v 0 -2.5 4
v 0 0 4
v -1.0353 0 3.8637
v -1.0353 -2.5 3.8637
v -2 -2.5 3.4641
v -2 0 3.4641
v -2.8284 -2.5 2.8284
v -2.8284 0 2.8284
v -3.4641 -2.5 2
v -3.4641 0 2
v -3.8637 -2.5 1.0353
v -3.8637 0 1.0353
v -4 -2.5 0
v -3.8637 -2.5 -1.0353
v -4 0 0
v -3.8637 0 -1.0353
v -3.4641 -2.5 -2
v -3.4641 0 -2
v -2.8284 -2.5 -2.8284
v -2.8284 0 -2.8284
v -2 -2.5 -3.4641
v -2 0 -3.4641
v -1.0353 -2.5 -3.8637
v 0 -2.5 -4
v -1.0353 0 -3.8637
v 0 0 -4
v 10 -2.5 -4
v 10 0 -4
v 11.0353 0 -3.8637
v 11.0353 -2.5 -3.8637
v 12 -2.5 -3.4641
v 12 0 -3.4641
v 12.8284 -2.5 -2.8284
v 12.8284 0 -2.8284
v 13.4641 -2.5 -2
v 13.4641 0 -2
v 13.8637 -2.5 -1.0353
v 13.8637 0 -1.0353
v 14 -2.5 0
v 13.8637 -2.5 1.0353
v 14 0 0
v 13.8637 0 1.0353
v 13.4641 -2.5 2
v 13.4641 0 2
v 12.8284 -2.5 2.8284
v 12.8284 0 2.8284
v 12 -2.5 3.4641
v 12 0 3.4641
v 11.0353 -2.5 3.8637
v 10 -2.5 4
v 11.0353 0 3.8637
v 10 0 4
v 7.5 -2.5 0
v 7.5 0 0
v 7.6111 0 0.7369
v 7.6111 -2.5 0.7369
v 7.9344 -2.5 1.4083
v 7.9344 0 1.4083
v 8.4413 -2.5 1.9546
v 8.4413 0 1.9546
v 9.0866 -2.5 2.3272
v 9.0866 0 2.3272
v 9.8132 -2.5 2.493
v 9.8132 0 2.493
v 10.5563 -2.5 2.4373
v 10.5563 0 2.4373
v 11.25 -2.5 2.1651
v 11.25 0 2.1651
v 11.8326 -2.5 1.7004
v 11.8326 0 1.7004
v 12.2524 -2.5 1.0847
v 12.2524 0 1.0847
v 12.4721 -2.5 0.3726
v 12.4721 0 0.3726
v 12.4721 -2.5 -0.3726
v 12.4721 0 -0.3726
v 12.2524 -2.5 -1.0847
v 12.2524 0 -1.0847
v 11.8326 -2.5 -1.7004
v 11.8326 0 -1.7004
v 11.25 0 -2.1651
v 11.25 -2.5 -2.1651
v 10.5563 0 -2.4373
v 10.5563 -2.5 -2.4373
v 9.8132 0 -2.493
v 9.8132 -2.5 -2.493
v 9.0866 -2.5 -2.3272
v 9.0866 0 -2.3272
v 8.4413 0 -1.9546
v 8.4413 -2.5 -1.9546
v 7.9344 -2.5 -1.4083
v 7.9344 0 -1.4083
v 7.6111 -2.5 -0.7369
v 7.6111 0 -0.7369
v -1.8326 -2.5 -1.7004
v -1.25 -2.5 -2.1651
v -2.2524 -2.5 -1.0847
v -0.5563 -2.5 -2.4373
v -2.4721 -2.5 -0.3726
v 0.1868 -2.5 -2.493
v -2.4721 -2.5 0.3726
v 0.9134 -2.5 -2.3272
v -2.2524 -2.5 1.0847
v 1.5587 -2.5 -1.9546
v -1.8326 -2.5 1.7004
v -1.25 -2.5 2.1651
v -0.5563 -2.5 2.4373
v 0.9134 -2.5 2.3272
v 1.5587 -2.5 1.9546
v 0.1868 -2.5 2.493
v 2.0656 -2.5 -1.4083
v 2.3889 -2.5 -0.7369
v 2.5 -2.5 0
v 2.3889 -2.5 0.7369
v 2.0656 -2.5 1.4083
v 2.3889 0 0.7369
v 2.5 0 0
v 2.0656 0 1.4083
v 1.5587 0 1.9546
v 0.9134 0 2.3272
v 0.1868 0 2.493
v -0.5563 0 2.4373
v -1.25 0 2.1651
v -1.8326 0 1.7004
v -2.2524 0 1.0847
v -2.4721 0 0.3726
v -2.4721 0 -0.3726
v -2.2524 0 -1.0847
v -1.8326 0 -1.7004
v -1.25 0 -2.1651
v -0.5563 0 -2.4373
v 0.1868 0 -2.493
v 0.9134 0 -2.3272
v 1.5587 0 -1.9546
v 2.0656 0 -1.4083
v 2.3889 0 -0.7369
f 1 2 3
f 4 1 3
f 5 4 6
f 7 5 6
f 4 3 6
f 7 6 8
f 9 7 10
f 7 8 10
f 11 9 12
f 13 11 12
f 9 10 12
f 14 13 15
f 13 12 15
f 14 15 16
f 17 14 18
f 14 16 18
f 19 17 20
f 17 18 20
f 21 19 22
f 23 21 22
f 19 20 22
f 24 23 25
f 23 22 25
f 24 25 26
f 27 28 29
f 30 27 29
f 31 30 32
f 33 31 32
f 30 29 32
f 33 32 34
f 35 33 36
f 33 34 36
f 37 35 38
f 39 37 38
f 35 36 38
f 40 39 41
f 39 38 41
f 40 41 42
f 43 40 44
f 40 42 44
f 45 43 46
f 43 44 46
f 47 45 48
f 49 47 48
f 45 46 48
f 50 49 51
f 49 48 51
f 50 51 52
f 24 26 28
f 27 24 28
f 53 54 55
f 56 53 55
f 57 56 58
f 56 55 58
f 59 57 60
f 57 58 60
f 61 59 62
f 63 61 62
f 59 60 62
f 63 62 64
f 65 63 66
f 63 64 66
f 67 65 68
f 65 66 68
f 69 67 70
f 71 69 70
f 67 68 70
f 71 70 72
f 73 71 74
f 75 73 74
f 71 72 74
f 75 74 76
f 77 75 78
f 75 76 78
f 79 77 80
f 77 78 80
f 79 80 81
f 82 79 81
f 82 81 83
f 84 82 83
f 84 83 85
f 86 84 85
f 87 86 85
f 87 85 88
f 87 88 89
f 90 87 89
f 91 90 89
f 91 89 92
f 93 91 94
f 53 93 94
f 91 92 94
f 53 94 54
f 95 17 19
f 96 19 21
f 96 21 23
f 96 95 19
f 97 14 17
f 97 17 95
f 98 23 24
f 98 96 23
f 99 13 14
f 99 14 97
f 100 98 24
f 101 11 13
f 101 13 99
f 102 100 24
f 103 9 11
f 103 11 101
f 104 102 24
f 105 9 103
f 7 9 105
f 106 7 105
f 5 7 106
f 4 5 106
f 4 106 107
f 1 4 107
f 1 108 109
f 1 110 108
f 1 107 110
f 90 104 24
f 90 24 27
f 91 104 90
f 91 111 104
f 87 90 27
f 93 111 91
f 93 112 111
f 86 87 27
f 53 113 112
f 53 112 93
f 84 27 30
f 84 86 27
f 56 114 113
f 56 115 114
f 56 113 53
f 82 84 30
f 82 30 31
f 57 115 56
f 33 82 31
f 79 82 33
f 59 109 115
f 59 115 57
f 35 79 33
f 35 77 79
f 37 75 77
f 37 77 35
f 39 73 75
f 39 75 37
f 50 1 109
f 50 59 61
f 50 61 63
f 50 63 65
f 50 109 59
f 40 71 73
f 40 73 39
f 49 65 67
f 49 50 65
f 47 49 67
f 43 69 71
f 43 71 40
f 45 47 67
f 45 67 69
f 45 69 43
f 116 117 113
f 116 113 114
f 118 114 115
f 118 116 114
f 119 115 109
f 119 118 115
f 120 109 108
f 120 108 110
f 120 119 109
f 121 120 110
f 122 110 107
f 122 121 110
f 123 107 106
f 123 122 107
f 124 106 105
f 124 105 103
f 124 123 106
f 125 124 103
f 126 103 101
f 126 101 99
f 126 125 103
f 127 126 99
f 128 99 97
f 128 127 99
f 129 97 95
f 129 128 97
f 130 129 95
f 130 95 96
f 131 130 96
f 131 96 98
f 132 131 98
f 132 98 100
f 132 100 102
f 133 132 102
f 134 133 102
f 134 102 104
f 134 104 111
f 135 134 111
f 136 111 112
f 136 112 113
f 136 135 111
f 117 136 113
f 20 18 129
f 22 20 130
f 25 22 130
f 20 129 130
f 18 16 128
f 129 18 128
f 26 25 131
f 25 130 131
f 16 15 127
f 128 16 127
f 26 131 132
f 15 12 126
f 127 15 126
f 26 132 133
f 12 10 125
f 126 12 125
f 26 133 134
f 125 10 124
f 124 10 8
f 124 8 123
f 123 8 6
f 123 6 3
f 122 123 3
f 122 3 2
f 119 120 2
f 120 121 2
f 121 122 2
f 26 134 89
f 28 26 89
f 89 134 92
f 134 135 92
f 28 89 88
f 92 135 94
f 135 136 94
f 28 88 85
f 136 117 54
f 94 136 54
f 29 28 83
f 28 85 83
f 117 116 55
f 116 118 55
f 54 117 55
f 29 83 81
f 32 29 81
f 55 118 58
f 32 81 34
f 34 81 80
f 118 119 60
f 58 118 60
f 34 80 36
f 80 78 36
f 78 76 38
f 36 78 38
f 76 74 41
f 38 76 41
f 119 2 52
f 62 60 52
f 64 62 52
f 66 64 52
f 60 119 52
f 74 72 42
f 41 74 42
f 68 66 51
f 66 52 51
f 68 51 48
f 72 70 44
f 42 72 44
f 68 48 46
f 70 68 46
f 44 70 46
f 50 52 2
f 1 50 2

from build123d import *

# Parameters (mm, degrees)
F0_R     = 2.5
F1_DEPTH = 2.5


with BuildPart() as f1:
    # F0 (on Front) → F1 (new body)
    with BuildSketch(Plane.XZ):
        with BuildLine():
            Line((10, 4), (0, 4))
            ThreePointArc((0, 4), (-4, 0), (0, -4))
            Line((0, -4), (10, -4))
            ThreePointArc((10, -4), (14, 0), (10, 4))
        make_face()
        Circle(F0_R, mode=Mode.SUBTRACT)
        with BuildLine():
            ThreePointArc((12.5, 0), (10, -2.5), (7.5, 0))
            ThreePointArc((7.5, 0), (10, 2.5), (12.5, 0))
        make_face(mode=Mode.SUBTRACT)
    extrude(amount=F1_DEPTH)


solid = f1.part
